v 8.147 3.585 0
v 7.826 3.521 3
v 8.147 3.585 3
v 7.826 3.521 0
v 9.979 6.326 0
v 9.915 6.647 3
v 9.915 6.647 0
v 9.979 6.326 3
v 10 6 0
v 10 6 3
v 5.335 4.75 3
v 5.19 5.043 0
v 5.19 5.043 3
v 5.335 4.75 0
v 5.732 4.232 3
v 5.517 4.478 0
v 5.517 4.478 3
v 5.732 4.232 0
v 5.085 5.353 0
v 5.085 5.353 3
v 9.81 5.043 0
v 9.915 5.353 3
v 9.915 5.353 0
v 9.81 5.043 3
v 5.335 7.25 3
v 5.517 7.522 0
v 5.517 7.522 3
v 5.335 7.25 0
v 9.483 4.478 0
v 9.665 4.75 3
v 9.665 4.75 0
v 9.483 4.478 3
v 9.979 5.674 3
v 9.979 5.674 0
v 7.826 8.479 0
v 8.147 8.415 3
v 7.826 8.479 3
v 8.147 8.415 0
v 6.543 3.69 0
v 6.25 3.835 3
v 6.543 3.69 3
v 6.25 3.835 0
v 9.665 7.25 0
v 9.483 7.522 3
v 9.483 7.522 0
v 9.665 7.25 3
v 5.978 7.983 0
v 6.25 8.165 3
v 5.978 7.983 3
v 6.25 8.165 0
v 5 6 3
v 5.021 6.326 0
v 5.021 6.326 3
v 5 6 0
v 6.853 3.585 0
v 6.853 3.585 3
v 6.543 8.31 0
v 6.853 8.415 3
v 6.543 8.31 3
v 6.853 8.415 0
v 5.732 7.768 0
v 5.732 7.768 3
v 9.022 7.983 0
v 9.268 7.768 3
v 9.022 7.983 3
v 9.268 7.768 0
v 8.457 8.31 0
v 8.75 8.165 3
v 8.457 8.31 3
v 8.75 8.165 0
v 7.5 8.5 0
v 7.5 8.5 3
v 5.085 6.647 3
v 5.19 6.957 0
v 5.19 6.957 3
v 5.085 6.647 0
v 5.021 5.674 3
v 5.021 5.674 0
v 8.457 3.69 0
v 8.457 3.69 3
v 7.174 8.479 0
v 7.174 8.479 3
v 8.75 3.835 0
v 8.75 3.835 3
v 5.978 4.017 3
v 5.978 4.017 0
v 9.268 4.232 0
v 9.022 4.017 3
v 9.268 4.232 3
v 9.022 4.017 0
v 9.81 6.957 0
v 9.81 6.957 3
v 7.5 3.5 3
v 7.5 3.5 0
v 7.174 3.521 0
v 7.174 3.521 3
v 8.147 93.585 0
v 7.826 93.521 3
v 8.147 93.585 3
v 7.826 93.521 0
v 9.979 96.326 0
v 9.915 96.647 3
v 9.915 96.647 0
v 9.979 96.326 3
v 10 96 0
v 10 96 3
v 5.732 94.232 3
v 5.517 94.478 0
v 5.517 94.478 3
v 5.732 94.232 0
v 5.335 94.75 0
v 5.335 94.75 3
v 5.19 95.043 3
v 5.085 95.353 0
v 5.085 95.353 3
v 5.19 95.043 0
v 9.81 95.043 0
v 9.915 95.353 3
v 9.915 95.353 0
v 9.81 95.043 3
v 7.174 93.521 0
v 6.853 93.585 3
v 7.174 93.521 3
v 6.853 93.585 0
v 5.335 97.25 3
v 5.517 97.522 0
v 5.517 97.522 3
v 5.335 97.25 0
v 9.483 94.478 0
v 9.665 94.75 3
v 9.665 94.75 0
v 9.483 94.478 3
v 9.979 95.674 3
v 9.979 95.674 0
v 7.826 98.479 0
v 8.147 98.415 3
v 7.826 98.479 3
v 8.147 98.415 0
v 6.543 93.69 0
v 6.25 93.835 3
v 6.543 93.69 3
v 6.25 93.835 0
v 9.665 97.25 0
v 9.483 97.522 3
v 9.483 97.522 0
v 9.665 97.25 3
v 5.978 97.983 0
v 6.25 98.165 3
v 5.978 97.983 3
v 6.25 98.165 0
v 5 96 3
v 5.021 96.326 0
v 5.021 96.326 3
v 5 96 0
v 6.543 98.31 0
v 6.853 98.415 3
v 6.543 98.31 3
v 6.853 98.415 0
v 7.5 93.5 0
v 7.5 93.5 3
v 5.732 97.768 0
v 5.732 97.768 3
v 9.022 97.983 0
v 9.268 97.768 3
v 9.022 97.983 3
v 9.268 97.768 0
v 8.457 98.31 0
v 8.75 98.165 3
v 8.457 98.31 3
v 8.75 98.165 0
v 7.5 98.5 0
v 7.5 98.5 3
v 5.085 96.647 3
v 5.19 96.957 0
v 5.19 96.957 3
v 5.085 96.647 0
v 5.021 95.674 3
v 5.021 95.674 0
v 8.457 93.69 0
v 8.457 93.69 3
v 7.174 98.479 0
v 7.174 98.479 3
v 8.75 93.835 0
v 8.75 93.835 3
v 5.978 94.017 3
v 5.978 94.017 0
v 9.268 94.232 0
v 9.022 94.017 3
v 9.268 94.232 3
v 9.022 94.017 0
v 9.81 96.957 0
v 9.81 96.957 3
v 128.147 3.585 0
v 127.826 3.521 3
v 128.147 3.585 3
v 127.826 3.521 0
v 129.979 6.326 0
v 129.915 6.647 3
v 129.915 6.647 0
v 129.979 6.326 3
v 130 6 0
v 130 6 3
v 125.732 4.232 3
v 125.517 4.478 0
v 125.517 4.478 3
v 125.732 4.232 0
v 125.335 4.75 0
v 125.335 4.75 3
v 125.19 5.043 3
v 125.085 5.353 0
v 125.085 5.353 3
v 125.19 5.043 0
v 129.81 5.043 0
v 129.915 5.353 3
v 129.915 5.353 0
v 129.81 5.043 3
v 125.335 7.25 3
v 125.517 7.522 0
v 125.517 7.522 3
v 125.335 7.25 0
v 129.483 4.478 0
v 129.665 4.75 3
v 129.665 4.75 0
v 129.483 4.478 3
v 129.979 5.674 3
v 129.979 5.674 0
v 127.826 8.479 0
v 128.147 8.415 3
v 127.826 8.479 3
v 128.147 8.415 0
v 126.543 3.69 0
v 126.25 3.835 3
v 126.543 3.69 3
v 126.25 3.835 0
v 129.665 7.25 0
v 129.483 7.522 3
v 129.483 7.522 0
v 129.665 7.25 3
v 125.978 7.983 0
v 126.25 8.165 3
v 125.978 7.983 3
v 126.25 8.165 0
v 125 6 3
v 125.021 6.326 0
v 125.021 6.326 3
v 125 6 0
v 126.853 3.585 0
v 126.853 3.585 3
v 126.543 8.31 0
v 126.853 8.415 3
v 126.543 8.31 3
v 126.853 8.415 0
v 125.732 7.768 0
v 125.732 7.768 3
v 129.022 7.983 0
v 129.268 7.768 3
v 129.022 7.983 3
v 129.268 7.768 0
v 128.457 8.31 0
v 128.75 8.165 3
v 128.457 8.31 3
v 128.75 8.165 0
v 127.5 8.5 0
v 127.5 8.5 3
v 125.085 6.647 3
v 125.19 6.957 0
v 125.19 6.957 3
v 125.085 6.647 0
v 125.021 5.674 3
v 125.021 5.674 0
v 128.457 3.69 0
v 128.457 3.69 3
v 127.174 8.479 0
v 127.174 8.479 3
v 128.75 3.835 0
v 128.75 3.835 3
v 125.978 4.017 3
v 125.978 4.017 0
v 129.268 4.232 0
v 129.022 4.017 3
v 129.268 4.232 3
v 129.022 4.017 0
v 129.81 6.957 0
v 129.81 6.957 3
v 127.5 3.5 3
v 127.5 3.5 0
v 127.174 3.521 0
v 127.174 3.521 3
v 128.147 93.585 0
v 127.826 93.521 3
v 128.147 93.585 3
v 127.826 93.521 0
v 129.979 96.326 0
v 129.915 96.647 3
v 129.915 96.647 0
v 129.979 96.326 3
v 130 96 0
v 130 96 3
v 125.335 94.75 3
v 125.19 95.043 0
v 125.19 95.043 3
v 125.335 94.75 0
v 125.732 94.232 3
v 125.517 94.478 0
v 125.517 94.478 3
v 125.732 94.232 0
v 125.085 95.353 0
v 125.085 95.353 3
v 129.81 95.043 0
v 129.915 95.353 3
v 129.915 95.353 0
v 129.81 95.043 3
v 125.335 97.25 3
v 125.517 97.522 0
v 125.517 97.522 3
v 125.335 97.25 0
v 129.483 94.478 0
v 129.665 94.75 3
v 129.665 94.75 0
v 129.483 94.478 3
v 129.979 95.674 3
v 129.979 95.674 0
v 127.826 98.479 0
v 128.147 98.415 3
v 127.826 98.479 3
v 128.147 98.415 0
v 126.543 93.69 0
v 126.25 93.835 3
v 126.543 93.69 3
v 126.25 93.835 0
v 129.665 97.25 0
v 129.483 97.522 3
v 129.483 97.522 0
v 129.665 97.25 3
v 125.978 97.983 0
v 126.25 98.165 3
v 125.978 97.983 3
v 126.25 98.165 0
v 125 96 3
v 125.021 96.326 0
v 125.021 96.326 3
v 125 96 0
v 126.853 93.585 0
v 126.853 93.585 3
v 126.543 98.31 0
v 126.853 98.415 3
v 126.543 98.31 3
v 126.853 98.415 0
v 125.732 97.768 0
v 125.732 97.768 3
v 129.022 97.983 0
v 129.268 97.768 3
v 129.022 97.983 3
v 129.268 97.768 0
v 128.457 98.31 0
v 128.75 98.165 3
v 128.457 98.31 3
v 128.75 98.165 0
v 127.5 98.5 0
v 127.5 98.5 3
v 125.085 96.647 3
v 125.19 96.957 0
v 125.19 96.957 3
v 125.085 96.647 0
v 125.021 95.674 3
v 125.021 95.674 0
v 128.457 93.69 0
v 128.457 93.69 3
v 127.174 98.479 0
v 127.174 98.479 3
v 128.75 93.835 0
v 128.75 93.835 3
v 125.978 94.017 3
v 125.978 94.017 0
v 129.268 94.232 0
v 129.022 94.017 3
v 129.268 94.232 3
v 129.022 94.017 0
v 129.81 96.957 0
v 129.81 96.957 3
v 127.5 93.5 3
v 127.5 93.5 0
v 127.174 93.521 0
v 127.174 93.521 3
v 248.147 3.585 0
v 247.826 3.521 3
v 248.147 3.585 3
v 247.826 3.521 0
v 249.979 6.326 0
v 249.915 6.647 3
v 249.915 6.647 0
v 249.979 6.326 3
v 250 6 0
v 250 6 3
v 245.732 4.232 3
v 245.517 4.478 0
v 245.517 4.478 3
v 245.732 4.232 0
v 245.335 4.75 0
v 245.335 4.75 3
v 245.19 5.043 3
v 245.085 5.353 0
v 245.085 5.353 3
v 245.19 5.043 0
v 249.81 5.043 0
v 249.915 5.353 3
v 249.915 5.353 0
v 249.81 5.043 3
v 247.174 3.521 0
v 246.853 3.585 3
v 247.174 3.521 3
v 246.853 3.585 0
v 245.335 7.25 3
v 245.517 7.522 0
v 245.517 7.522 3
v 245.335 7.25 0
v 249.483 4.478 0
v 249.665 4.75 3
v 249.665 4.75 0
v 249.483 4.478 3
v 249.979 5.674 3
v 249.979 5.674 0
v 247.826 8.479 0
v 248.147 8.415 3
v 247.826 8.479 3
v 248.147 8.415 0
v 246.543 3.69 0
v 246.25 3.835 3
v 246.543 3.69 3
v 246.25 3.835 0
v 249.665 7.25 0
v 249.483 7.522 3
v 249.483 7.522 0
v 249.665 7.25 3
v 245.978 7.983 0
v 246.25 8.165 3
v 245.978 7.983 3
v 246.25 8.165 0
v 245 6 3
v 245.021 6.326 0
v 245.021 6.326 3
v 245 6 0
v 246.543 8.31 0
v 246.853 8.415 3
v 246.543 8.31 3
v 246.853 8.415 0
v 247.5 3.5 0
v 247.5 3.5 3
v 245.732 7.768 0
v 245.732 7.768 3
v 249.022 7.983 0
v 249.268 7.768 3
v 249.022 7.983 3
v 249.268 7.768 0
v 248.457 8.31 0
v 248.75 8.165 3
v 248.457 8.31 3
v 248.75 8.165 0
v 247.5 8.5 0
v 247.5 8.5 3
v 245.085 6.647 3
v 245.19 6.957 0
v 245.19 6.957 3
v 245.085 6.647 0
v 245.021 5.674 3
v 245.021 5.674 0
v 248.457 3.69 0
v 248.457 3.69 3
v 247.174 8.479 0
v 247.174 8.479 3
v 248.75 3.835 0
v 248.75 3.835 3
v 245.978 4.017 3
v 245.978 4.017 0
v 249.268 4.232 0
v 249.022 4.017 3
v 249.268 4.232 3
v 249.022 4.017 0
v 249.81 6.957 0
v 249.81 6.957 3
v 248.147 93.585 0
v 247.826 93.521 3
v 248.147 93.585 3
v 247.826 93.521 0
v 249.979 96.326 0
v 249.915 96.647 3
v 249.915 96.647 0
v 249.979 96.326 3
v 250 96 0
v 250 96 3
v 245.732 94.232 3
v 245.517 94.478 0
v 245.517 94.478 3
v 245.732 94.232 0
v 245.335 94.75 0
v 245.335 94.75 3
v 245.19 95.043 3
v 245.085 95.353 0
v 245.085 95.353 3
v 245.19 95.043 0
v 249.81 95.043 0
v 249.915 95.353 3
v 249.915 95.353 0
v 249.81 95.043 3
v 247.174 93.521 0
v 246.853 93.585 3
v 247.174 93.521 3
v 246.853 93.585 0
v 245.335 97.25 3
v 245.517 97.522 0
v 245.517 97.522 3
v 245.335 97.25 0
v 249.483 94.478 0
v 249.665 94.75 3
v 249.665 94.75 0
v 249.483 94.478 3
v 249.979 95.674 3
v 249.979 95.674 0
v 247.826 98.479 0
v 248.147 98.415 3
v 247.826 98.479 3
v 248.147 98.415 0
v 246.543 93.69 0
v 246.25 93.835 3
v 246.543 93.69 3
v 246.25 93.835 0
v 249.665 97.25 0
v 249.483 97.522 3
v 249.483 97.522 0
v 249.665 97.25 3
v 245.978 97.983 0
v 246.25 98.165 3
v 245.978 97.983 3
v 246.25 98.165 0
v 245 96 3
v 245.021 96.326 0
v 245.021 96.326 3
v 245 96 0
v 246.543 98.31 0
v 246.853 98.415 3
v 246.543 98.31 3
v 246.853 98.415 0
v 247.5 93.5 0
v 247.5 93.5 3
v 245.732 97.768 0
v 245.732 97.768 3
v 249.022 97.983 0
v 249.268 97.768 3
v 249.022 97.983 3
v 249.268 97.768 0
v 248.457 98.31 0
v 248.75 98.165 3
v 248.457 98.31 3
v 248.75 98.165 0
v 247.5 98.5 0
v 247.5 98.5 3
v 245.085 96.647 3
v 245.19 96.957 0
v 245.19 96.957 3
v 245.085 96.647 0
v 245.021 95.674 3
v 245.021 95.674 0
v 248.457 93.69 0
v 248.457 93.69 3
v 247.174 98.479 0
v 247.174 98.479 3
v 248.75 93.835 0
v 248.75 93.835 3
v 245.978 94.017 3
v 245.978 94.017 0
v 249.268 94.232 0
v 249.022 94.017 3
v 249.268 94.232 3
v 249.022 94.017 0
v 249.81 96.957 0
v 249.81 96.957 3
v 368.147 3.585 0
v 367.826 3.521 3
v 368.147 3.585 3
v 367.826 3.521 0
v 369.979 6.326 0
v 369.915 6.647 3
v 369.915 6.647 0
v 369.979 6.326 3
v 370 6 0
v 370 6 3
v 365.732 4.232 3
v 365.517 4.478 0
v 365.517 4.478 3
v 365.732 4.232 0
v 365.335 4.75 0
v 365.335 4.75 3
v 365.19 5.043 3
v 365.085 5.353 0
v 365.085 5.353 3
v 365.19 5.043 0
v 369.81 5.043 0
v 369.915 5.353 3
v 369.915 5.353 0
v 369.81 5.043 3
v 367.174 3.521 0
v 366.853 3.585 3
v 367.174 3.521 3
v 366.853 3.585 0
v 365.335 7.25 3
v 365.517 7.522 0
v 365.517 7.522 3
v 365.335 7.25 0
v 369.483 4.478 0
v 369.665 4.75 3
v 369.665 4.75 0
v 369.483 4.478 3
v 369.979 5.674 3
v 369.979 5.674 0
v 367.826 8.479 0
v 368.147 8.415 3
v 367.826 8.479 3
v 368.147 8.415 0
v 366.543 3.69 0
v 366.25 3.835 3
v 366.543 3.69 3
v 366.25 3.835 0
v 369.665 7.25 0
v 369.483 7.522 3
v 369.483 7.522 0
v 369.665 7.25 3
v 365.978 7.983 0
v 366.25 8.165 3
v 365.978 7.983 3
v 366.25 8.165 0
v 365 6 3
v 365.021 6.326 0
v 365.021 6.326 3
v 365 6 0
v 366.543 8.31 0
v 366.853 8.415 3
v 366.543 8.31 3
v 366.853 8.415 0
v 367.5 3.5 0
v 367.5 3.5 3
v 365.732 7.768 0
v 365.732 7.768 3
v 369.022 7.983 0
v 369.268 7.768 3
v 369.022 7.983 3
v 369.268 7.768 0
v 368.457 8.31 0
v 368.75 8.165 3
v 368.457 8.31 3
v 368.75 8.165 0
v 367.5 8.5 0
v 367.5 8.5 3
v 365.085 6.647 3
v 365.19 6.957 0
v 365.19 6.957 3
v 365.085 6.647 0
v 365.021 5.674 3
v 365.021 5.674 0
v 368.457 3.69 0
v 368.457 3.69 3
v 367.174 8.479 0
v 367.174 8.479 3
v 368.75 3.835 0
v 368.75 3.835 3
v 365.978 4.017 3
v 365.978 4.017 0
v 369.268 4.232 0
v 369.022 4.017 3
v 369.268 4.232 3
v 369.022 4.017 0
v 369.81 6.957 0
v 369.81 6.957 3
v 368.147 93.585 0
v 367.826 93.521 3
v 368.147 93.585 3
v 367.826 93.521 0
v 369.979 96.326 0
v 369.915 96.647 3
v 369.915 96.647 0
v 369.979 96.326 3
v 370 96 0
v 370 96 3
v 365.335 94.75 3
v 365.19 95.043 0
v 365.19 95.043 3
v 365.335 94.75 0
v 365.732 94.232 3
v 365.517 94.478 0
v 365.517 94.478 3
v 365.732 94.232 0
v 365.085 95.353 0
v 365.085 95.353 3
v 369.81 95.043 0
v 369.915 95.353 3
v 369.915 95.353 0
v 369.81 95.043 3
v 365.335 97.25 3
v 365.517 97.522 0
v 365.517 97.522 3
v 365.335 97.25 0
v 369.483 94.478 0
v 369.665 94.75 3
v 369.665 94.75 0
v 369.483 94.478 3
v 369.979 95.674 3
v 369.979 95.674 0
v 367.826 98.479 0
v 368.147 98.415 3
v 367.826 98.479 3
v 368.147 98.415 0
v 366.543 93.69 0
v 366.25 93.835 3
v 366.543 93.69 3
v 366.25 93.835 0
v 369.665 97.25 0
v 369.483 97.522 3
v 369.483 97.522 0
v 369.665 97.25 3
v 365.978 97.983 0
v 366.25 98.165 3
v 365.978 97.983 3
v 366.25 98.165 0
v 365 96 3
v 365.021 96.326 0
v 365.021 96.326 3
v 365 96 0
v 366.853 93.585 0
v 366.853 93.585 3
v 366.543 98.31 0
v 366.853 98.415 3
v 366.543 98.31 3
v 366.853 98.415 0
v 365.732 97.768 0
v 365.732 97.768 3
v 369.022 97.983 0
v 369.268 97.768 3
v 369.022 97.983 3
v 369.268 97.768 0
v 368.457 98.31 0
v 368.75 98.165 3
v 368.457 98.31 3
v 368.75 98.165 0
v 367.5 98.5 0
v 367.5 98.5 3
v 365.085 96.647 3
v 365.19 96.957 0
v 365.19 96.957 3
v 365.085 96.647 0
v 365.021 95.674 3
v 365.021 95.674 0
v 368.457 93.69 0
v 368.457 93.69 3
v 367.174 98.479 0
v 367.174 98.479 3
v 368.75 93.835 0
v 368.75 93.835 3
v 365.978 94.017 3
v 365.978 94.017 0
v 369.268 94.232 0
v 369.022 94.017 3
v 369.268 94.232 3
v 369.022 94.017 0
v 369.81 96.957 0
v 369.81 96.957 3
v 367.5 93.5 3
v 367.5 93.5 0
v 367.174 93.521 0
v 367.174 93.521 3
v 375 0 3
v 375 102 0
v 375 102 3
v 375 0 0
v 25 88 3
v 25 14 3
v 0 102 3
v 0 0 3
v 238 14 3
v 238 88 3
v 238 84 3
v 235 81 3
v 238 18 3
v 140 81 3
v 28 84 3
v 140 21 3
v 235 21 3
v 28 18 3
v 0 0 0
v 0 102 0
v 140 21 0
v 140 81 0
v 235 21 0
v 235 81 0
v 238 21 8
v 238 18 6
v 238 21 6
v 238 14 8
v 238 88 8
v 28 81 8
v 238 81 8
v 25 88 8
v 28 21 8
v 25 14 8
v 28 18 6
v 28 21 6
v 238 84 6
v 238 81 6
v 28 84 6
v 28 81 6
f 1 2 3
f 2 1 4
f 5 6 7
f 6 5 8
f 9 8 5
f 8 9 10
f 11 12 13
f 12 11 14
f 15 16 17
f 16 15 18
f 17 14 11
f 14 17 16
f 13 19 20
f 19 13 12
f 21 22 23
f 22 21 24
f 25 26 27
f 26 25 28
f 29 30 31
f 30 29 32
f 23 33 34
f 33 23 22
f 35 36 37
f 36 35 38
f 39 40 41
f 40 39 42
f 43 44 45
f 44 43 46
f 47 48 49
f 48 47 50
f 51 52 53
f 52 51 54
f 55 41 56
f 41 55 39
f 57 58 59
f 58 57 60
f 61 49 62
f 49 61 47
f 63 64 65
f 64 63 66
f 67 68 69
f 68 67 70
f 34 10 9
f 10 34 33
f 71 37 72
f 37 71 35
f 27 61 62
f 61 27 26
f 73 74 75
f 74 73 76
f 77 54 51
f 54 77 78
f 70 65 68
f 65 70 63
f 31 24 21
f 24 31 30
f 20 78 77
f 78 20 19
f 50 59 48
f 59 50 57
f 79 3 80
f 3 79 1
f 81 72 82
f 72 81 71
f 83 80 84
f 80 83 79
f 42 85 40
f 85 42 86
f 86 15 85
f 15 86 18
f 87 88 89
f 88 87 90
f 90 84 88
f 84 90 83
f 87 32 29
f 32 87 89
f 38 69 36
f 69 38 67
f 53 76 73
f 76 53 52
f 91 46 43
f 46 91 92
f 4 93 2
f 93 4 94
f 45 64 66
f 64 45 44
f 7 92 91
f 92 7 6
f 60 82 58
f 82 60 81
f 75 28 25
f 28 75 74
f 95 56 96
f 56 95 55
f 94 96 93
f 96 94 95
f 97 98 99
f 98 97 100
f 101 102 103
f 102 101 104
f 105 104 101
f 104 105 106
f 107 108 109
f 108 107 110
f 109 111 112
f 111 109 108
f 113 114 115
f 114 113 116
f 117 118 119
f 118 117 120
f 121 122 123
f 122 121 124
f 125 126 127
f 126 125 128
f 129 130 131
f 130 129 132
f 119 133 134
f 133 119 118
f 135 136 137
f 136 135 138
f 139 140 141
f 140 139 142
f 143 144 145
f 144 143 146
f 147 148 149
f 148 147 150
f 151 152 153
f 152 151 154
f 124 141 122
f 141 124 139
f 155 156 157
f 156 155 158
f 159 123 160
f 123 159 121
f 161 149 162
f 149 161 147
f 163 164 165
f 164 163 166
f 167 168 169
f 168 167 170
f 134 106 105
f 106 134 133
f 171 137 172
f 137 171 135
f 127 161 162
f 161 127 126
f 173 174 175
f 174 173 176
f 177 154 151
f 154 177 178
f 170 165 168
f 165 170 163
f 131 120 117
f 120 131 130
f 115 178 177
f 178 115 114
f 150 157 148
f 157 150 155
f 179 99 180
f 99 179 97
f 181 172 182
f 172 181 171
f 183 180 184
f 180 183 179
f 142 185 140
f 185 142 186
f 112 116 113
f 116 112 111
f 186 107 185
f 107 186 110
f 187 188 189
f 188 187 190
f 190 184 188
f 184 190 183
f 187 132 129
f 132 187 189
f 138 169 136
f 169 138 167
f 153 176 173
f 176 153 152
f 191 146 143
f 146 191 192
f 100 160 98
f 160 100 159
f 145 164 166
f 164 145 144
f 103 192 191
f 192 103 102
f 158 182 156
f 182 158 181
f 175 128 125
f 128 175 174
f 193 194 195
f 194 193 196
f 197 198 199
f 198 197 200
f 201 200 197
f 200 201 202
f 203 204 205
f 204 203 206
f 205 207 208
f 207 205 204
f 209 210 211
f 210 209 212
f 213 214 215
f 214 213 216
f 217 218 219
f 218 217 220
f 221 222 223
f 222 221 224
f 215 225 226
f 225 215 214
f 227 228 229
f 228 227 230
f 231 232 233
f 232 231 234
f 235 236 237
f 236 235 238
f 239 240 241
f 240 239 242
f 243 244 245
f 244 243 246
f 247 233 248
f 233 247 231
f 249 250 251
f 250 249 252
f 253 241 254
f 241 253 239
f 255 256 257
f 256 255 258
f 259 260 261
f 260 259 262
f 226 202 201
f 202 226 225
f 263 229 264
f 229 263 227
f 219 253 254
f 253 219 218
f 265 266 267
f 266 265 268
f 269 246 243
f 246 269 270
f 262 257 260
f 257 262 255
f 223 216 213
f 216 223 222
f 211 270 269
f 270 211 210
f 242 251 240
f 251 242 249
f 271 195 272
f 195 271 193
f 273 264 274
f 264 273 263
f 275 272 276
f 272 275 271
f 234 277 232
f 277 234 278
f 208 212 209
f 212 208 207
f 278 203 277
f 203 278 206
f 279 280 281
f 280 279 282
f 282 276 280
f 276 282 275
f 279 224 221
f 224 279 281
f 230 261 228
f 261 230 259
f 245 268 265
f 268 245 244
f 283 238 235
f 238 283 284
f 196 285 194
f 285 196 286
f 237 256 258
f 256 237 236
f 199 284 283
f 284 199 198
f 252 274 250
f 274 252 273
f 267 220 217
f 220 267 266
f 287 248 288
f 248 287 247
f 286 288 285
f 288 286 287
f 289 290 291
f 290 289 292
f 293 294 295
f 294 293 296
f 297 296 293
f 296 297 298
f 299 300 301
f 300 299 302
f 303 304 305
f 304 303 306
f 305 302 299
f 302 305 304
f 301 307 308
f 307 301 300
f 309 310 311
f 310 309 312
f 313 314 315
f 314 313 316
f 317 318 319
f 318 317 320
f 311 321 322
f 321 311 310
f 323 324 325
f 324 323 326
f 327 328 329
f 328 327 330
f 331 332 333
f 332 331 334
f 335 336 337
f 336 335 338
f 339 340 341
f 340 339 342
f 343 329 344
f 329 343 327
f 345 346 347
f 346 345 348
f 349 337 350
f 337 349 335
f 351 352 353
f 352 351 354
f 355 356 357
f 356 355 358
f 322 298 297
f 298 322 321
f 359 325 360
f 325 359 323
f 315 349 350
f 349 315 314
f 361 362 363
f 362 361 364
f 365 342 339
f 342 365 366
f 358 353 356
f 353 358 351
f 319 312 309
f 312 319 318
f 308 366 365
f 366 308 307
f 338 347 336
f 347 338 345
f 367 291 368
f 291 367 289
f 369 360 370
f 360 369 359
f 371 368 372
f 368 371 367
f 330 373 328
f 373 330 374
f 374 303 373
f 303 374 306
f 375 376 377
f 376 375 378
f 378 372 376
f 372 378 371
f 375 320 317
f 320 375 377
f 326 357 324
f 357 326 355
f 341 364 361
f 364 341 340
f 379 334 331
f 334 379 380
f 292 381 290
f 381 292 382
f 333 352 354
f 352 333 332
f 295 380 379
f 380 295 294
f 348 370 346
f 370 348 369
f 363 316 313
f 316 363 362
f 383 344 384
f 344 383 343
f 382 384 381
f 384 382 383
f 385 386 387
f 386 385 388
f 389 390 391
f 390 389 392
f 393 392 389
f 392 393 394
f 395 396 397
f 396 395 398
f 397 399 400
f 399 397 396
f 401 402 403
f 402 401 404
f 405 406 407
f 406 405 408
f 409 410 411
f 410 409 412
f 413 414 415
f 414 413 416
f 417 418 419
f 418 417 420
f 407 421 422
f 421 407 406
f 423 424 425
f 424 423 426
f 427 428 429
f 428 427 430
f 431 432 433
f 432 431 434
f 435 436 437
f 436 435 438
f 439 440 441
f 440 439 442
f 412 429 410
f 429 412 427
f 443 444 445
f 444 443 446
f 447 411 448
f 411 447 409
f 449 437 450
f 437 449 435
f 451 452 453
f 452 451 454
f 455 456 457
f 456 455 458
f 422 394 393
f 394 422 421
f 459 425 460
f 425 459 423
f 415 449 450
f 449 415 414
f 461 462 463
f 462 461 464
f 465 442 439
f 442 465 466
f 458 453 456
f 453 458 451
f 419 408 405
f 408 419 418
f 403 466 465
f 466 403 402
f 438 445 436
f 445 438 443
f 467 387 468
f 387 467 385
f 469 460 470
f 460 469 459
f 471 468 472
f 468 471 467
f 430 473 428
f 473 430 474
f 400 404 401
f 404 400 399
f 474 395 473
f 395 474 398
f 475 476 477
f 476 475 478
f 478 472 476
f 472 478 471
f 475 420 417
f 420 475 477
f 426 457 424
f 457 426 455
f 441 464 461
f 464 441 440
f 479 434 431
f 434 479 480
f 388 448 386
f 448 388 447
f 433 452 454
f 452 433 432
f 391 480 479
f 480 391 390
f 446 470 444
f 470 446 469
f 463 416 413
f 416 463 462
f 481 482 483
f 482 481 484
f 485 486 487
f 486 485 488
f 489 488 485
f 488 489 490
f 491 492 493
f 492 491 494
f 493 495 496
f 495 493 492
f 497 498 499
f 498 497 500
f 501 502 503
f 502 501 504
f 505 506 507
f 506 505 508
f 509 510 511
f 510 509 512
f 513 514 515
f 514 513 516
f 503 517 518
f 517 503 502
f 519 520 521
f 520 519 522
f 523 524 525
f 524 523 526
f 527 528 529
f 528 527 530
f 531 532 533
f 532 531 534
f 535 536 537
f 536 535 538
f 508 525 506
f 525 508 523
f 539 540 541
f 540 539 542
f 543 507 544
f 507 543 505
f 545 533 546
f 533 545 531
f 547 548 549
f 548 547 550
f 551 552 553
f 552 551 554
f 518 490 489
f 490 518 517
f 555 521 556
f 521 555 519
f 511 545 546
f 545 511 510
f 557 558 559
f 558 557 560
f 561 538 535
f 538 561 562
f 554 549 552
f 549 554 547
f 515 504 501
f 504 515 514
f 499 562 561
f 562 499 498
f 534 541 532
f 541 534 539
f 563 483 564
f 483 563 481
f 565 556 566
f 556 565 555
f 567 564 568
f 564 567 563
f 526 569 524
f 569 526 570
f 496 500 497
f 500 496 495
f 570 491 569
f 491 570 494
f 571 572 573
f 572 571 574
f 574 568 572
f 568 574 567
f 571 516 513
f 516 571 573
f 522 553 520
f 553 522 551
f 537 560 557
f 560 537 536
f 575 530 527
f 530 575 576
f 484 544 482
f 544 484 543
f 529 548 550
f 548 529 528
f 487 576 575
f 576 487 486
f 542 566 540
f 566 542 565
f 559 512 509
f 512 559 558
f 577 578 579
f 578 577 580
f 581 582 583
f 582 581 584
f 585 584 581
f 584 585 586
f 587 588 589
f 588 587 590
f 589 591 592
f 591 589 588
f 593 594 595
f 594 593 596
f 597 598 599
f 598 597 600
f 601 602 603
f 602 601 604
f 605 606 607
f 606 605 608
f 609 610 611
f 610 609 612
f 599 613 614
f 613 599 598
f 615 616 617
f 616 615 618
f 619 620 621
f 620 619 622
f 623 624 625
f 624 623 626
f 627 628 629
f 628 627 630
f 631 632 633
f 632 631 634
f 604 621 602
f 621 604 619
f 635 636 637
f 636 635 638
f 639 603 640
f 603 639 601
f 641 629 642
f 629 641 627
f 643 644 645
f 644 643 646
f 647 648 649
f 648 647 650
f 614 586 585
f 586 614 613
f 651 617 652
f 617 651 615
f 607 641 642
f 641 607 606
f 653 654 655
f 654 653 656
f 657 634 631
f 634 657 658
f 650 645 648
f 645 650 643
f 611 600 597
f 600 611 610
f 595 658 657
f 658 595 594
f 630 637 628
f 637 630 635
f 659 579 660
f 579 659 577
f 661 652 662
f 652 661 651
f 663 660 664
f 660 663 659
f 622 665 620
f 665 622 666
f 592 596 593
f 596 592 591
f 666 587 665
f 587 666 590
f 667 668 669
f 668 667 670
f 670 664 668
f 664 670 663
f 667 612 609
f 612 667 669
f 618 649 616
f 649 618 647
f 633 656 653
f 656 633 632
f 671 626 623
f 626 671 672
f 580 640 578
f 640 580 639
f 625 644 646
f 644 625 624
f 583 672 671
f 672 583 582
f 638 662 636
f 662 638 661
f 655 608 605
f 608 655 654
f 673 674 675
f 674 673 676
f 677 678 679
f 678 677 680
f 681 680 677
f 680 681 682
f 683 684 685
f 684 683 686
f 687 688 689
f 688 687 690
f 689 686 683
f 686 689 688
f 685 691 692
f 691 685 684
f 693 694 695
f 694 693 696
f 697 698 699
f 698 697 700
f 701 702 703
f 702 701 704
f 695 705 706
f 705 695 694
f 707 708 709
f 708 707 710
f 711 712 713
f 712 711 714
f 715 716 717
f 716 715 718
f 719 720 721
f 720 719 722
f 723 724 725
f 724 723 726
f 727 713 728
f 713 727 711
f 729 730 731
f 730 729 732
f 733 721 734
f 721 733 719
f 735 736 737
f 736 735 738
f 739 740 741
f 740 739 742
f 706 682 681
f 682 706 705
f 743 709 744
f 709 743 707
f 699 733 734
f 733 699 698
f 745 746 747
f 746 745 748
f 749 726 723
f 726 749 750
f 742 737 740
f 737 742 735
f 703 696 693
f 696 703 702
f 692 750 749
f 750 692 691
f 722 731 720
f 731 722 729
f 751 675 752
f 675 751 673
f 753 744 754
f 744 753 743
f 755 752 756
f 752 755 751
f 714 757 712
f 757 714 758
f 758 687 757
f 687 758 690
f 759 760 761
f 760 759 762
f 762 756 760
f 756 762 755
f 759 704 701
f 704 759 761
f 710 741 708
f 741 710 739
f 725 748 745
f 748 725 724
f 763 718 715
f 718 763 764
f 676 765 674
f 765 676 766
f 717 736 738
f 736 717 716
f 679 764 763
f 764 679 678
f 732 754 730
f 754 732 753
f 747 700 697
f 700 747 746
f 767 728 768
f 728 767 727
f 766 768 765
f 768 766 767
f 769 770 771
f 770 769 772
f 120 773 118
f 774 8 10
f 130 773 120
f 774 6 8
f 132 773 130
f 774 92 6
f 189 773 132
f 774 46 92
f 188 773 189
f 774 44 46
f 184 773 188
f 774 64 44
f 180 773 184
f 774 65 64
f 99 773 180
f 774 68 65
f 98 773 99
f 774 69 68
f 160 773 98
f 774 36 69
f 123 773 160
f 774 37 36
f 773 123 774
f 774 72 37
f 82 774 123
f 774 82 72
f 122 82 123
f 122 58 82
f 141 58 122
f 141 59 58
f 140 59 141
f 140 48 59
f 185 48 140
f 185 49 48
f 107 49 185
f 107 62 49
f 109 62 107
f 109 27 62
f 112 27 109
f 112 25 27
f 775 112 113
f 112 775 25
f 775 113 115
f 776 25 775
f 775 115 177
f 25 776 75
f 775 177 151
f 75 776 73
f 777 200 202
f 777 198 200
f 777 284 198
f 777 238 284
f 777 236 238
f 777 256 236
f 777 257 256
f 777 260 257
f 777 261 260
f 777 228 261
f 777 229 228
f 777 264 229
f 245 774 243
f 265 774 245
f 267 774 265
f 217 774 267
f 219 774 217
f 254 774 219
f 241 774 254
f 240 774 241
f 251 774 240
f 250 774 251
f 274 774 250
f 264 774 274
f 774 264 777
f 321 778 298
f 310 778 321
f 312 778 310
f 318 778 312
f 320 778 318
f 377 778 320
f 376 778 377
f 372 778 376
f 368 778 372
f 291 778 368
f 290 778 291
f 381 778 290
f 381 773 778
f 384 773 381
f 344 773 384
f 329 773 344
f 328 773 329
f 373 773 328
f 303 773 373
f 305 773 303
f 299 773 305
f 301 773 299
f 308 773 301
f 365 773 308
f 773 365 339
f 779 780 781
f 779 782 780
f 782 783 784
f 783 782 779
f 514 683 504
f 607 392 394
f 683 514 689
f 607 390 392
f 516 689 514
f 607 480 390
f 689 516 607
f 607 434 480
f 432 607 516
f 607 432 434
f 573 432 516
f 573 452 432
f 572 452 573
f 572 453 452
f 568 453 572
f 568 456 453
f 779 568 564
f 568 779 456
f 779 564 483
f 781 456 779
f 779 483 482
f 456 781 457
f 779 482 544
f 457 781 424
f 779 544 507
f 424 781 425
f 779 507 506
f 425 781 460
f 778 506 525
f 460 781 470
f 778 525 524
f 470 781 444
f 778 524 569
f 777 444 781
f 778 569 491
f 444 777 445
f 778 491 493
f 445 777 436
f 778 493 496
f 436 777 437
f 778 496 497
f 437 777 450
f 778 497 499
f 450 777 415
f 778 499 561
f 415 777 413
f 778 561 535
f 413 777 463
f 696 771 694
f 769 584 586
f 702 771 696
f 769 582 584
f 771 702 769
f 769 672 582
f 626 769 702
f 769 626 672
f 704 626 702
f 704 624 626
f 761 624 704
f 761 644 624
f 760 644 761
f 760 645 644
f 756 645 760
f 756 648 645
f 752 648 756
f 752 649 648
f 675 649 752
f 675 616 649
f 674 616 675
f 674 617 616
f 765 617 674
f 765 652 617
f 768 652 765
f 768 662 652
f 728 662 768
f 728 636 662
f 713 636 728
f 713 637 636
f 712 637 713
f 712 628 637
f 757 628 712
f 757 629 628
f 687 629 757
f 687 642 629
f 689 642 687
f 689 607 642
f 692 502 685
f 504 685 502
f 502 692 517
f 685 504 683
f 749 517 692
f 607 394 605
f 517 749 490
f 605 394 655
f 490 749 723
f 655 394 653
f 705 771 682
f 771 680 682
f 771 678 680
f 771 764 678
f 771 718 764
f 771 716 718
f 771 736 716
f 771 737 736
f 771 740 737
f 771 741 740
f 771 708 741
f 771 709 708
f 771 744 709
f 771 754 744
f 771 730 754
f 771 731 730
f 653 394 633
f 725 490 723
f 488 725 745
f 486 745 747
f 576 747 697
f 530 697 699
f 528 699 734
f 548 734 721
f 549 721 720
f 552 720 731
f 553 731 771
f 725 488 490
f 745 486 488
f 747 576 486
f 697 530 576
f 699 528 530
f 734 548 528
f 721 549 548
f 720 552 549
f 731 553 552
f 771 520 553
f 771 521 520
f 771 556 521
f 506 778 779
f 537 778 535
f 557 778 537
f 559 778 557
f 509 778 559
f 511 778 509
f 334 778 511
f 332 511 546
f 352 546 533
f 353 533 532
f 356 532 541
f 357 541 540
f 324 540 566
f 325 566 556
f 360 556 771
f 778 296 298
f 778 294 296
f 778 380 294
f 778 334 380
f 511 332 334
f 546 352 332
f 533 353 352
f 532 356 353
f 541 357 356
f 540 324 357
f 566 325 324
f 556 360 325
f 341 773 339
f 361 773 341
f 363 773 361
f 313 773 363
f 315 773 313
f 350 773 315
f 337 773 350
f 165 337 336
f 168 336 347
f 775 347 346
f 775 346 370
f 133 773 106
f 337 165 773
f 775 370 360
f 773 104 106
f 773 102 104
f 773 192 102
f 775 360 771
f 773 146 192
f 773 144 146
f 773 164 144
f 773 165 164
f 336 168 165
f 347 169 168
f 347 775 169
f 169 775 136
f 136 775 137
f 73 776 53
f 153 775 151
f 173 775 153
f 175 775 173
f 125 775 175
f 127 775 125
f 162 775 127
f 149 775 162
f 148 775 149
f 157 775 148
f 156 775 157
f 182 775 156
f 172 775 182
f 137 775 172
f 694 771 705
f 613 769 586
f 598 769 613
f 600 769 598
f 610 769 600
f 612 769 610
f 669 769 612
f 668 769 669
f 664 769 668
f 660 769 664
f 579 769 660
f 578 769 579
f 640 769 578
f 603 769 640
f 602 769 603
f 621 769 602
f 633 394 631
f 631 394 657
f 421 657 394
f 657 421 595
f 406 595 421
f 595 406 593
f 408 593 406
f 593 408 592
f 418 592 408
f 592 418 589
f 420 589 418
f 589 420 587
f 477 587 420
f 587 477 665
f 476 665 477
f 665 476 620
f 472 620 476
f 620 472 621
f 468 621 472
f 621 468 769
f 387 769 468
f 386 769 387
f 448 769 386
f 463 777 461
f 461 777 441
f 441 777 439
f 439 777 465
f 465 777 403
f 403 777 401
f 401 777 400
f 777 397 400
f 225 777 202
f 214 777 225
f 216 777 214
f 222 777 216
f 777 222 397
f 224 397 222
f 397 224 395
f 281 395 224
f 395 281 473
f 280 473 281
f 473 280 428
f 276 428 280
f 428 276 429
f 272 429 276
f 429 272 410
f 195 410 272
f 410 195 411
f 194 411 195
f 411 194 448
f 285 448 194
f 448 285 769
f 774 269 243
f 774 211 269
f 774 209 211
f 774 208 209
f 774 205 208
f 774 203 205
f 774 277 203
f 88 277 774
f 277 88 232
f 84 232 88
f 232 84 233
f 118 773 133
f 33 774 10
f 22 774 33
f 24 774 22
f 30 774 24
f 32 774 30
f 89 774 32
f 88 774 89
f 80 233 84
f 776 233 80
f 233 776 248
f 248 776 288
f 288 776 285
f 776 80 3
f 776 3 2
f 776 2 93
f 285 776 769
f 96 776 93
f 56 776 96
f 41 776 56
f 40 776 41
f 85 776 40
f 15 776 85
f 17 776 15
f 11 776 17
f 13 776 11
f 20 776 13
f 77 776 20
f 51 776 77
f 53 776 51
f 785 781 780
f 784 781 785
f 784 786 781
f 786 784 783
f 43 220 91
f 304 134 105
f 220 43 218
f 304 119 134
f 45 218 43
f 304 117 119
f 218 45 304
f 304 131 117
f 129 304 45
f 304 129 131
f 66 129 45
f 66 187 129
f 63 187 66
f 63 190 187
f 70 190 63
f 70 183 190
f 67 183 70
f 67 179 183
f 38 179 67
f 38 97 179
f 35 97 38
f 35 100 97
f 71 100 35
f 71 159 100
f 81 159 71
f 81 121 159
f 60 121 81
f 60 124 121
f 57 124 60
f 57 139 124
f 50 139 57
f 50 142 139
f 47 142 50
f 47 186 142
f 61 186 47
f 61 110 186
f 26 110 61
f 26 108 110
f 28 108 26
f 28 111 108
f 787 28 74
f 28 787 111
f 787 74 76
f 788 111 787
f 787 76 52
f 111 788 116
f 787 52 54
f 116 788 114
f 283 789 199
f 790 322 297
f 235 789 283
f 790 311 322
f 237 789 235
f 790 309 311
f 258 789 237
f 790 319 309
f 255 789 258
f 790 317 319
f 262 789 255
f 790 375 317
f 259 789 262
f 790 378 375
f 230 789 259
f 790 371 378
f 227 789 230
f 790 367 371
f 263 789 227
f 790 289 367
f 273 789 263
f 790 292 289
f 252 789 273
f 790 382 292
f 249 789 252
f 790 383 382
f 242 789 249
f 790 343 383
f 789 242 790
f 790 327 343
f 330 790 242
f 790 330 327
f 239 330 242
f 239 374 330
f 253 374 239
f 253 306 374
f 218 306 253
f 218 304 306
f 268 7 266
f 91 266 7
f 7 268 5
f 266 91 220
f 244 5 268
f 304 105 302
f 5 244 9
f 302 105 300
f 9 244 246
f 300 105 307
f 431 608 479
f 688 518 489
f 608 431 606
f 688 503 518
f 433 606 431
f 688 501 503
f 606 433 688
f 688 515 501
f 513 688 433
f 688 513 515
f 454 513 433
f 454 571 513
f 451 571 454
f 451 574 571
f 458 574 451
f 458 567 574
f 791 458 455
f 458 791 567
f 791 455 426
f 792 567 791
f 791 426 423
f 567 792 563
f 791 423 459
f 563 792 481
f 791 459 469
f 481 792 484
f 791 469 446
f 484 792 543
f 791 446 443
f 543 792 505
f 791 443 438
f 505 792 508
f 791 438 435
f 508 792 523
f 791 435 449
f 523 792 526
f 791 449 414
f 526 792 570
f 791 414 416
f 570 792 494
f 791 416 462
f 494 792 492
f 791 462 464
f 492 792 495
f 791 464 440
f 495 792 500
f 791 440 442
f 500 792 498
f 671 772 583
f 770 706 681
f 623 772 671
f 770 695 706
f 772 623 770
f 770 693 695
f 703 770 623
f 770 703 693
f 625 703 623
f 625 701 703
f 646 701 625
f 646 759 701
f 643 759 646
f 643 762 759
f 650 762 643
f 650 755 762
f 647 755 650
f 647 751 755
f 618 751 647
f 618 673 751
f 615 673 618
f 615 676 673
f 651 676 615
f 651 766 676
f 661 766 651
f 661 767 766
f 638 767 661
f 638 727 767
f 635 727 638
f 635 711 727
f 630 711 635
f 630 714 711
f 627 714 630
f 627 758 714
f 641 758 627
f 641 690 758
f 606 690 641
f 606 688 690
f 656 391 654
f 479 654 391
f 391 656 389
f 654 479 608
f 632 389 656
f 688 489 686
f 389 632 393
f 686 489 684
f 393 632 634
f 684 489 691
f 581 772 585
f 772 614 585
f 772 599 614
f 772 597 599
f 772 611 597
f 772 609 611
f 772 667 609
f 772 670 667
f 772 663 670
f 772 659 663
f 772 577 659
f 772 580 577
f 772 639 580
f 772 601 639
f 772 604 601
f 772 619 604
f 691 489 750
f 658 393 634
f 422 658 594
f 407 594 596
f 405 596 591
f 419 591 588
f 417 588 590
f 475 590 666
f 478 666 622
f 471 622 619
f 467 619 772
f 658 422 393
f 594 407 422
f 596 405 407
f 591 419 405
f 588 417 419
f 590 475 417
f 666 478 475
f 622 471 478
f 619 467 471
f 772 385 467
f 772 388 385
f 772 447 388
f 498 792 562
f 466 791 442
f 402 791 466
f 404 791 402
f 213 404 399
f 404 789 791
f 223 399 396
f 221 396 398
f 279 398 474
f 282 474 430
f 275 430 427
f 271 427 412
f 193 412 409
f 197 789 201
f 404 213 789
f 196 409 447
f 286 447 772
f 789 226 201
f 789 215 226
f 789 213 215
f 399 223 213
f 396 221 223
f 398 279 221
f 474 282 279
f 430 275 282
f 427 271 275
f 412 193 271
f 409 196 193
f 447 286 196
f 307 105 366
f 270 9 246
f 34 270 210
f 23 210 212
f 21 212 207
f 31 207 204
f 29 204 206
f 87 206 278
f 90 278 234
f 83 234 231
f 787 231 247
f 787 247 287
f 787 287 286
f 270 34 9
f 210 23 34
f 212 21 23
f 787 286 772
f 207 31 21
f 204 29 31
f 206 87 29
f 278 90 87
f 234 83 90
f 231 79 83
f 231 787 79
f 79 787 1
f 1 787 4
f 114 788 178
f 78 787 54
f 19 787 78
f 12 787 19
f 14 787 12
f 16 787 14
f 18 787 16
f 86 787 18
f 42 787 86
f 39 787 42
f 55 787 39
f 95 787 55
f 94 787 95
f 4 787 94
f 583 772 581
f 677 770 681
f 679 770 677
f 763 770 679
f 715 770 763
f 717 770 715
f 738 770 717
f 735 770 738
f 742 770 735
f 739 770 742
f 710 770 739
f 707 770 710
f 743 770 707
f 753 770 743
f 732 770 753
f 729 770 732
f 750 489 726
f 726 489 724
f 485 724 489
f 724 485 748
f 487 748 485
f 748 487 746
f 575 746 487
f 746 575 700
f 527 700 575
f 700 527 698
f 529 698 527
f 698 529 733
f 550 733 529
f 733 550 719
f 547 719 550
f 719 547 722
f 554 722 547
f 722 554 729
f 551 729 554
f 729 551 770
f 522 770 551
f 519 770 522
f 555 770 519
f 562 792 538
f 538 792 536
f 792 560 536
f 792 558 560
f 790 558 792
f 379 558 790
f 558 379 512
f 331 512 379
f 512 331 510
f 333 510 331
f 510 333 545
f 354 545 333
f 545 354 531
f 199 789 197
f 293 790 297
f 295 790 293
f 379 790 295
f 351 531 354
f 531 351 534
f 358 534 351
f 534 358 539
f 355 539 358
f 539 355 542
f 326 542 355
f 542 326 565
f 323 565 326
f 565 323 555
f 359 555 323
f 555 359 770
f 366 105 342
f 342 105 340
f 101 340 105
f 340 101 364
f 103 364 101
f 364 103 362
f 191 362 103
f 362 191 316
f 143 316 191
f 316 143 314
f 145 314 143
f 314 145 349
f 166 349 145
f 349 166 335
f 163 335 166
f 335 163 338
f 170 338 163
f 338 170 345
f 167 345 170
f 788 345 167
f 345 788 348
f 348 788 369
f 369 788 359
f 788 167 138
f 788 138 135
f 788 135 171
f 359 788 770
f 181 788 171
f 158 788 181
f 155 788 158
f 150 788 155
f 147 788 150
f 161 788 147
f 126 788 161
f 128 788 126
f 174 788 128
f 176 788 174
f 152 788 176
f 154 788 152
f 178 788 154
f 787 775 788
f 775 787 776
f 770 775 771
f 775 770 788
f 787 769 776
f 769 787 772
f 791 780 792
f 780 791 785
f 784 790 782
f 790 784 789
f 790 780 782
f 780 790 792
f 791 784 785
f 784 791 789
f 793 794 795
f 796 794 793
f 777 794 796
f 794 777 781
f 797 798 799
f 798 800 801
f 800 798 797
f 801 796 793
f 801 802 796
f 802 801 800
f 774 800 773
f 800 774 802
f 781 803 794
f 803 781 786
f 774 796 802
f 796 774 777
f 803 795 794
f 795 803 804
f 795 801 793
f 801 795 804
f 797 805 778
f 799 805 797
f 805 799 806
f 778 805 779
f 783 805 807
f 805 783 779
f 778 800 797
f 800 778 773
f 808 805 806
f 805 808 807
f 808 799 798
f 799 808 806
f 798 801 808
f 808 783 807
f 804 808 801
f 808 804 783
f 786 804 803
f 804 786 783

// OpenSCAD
// E12 deck plate - sliding battery access door
//
// Part 1 (base): full plate, 6 mounting holes, rectangular access opening,
//                captive C-channel rails either side of the opening.
// Part 2 (door): panel that slides in those rails to expose/cover the opening.
//
// Rails sit INBOARD of the mounting holes (holes at y=6/96, rails at y=18/84)
// so they never clash. The opening sits BETWEEN hole pairs so no fastener is lost.
//
// Opening defaults to the widest clear bay. Set OPEN_X0/OPEN_X1 to move it.

$fn = 48;

PLATE_L = 375;
PLATE_W = 102;
T       = 3;

PITCH   = 120;
SPAN_W  = 90;
FIRST_X = 7.5;
HOLE_D  = 5.0;
N_PAIRS = 4;

// --- access opening (between hole pairs 2 and 3: x=135 and x=255) ---
OPEN_X0 = 140;
OPEN_X1 = 235;          // 90 mm clear
OPEN_W  = 60;           // across the plate

// --- slide hardware ---
DOOR_T    = 2.4;        // door thickness
CHAN_H    = 3.0;        // channel height (0.6 clearance over the door)
LIP       = 3;          // how far the lip overhangs inward
RAIL_W    = 4;          // rail wall thickness
CLR       = 0.4;        // side clearance

DOOR_L    = (OPEN_X1 - OPEN_X0) + 14;      // overlap each end
DOOR_W    = OPEN_W + 2*LIP;                 // sits under the lips
TRAVEL    = DOOR_L + 6;                     // retract room

RAIL_Y0 = PLATE_W/2 - DOOR_W/2;             // channel inner faces
RAIL_Y1 = PLATE_W/2 + DOOR_W/2;
RAIL_X0 = OPEN_X0 - TRAVEL;
RAIL_X1 = OPEN_X1 + 3;   // keep rails clear of the tongue at x=240

module mount_holes() {
  for (i = [0 : N_PAIRS-1]) {
    x = FIRST_X + i*PITCH;
    translate([x, PLATE_W/2 - SPAN_W/2, -1]) cylinder(d=HOLE_D, h=T+2);
    translate([x, PLATE_W/2 + SPAN_W/2, -1]) cylinder(d=HOLE_D, h=T+2);
  }
}

module rail(ymin) {
  // vertical wall plus an inward lip at the top -> C-channel
  translate([RAIL_X0, ymin - RAIL_W, T]) cube([RAIL_X1-RAIL_X0, RAIL_W, CHAN_H + 2]);
  translate([RAIL_X0, ymin, T + CHAN_H])  cube([RAIL_X1-RAIL_X0, LIP, 2]);
}

module base() {
  difference() {
    cube([PLATE_L, PLATE_W, T]);
    translate([OPEN_X0, PLATE_W/2 - OPEN_W/2, -1])
      cube([OPEN_X1-OPEN_X0, OPEN_W, T+2]);
    mount_holes();
  }
  rail(RAIL_Y0);
  mirror([0,1,0]) translate([0,-PLATE_W,0]) rail(RAIL_Y0);
  // end stop so the door cannot slide out of the retracted end
  translate([RAIL_X0, RAIL_Y0 - RAIL_W, T]) cube([3, DOOR_W + 2*RAIL_W, CHAN_H + 2]);
}

module door() {
  difference() {
    union() {
      cube([DOOR_L, DOOR_W - 2*CLR, DOOR_T]);
      // finger tab
      translate([DOOR_L - 12, (DOOR_W - 2*CLR)/2 - 9, DOOR_T])
        cube([10, 18, 3]);
    }
    // grip ribs on the tab
    for (i=[0:3])
      translate([DOOR_L - 11 + i*2.4, -1, DOOR_T + 2.2])
        rotate([0,45,0]) cube([1.2, DOOR_W, 1.2]);
  }
}

// ---- split for printers under 375 mm ------------------------------------
// Split at x=290: rails (40-246) and opening (150-240) stay wholly in part A,
// so nothing that must stay aligned crosses the joint. All three hole pairs
// (15/135/255) are also in A. Part B is a plain extension.
SPLIT_X = 280;
LAP     = 40;          // overlap. Deep enough that the x=247.5 fastener
                       // falls fully INSIDE the tongue (245-250 within 240-280)
                       // rather than tangent to its back face at x=245.
PIN_D   = 4.2;

// Registration keys instead of pin holes. Two integral bosses on B's tongue
// drop into matching pockets in A's rebate, so the halves self-align and stay
// put with glue alone - no separate pins, nothing to source.
KEY_L = 10; KEY_W = 5; KEY_H = 1.2; KEY_CLR = 0.25;

module key_solid() {
  for (dx = [10, 25])
    translate([SPLIT_X - LAP + dx - KEY_L/2, PLATE_W/2 - KEY_W/2, T/2])
      cube([KEY_L, KEY_W, KEY_H]);
}
module key_pocket() {
  for (dx = [10, 25])
    translate([SPLIT_X - LAP + dx - KEY_L/2 - KEY_CLR,
               PLATE_W/2 - KEY_W/2 - KEY_CLR, T/2 - 0.01])
      cube([KEY_L + 2*KEY_CLR, KEY_W + 2*KEY_CLR, KEY_H + KEY_CLR]);
}

module base_A() {
  difference() {
    intersection() {
      base();
      translate([-1, -1, -1]) cube([SPLIT_X + 1, PLATE_W + 2, 40]);
    }
    // rebate in A's underside to receive B's tongue
    translate([SPLIT_X - LAP, -1, -0.1]) cube([LAP + 1, PLATE_W + 2, T/2 + 0.1]);
    key_pocket();
  }
}

module base_B() {
  difference() {
    union() {
      translate([SPLIT_X, 0, 0]) cube([PLATE_L - SPLIT_X, PLATE_W, T]);
      translate([SPLIT_X - LAP, 0, 0]) cube([LAP, PLATE_W, T/2]);   // tongue
      key_solid();
    }
    mount_holes();     // <-- part B needs its fasteners too
  }
}

PART = "base";    // "base" | "door" | "baseA" | "baseB"
if      (PART == "base")  base();
else if (PART == "door")  door();
else if (PART == "baseA") base_A();
else if (PART == "baseB") base_B();
